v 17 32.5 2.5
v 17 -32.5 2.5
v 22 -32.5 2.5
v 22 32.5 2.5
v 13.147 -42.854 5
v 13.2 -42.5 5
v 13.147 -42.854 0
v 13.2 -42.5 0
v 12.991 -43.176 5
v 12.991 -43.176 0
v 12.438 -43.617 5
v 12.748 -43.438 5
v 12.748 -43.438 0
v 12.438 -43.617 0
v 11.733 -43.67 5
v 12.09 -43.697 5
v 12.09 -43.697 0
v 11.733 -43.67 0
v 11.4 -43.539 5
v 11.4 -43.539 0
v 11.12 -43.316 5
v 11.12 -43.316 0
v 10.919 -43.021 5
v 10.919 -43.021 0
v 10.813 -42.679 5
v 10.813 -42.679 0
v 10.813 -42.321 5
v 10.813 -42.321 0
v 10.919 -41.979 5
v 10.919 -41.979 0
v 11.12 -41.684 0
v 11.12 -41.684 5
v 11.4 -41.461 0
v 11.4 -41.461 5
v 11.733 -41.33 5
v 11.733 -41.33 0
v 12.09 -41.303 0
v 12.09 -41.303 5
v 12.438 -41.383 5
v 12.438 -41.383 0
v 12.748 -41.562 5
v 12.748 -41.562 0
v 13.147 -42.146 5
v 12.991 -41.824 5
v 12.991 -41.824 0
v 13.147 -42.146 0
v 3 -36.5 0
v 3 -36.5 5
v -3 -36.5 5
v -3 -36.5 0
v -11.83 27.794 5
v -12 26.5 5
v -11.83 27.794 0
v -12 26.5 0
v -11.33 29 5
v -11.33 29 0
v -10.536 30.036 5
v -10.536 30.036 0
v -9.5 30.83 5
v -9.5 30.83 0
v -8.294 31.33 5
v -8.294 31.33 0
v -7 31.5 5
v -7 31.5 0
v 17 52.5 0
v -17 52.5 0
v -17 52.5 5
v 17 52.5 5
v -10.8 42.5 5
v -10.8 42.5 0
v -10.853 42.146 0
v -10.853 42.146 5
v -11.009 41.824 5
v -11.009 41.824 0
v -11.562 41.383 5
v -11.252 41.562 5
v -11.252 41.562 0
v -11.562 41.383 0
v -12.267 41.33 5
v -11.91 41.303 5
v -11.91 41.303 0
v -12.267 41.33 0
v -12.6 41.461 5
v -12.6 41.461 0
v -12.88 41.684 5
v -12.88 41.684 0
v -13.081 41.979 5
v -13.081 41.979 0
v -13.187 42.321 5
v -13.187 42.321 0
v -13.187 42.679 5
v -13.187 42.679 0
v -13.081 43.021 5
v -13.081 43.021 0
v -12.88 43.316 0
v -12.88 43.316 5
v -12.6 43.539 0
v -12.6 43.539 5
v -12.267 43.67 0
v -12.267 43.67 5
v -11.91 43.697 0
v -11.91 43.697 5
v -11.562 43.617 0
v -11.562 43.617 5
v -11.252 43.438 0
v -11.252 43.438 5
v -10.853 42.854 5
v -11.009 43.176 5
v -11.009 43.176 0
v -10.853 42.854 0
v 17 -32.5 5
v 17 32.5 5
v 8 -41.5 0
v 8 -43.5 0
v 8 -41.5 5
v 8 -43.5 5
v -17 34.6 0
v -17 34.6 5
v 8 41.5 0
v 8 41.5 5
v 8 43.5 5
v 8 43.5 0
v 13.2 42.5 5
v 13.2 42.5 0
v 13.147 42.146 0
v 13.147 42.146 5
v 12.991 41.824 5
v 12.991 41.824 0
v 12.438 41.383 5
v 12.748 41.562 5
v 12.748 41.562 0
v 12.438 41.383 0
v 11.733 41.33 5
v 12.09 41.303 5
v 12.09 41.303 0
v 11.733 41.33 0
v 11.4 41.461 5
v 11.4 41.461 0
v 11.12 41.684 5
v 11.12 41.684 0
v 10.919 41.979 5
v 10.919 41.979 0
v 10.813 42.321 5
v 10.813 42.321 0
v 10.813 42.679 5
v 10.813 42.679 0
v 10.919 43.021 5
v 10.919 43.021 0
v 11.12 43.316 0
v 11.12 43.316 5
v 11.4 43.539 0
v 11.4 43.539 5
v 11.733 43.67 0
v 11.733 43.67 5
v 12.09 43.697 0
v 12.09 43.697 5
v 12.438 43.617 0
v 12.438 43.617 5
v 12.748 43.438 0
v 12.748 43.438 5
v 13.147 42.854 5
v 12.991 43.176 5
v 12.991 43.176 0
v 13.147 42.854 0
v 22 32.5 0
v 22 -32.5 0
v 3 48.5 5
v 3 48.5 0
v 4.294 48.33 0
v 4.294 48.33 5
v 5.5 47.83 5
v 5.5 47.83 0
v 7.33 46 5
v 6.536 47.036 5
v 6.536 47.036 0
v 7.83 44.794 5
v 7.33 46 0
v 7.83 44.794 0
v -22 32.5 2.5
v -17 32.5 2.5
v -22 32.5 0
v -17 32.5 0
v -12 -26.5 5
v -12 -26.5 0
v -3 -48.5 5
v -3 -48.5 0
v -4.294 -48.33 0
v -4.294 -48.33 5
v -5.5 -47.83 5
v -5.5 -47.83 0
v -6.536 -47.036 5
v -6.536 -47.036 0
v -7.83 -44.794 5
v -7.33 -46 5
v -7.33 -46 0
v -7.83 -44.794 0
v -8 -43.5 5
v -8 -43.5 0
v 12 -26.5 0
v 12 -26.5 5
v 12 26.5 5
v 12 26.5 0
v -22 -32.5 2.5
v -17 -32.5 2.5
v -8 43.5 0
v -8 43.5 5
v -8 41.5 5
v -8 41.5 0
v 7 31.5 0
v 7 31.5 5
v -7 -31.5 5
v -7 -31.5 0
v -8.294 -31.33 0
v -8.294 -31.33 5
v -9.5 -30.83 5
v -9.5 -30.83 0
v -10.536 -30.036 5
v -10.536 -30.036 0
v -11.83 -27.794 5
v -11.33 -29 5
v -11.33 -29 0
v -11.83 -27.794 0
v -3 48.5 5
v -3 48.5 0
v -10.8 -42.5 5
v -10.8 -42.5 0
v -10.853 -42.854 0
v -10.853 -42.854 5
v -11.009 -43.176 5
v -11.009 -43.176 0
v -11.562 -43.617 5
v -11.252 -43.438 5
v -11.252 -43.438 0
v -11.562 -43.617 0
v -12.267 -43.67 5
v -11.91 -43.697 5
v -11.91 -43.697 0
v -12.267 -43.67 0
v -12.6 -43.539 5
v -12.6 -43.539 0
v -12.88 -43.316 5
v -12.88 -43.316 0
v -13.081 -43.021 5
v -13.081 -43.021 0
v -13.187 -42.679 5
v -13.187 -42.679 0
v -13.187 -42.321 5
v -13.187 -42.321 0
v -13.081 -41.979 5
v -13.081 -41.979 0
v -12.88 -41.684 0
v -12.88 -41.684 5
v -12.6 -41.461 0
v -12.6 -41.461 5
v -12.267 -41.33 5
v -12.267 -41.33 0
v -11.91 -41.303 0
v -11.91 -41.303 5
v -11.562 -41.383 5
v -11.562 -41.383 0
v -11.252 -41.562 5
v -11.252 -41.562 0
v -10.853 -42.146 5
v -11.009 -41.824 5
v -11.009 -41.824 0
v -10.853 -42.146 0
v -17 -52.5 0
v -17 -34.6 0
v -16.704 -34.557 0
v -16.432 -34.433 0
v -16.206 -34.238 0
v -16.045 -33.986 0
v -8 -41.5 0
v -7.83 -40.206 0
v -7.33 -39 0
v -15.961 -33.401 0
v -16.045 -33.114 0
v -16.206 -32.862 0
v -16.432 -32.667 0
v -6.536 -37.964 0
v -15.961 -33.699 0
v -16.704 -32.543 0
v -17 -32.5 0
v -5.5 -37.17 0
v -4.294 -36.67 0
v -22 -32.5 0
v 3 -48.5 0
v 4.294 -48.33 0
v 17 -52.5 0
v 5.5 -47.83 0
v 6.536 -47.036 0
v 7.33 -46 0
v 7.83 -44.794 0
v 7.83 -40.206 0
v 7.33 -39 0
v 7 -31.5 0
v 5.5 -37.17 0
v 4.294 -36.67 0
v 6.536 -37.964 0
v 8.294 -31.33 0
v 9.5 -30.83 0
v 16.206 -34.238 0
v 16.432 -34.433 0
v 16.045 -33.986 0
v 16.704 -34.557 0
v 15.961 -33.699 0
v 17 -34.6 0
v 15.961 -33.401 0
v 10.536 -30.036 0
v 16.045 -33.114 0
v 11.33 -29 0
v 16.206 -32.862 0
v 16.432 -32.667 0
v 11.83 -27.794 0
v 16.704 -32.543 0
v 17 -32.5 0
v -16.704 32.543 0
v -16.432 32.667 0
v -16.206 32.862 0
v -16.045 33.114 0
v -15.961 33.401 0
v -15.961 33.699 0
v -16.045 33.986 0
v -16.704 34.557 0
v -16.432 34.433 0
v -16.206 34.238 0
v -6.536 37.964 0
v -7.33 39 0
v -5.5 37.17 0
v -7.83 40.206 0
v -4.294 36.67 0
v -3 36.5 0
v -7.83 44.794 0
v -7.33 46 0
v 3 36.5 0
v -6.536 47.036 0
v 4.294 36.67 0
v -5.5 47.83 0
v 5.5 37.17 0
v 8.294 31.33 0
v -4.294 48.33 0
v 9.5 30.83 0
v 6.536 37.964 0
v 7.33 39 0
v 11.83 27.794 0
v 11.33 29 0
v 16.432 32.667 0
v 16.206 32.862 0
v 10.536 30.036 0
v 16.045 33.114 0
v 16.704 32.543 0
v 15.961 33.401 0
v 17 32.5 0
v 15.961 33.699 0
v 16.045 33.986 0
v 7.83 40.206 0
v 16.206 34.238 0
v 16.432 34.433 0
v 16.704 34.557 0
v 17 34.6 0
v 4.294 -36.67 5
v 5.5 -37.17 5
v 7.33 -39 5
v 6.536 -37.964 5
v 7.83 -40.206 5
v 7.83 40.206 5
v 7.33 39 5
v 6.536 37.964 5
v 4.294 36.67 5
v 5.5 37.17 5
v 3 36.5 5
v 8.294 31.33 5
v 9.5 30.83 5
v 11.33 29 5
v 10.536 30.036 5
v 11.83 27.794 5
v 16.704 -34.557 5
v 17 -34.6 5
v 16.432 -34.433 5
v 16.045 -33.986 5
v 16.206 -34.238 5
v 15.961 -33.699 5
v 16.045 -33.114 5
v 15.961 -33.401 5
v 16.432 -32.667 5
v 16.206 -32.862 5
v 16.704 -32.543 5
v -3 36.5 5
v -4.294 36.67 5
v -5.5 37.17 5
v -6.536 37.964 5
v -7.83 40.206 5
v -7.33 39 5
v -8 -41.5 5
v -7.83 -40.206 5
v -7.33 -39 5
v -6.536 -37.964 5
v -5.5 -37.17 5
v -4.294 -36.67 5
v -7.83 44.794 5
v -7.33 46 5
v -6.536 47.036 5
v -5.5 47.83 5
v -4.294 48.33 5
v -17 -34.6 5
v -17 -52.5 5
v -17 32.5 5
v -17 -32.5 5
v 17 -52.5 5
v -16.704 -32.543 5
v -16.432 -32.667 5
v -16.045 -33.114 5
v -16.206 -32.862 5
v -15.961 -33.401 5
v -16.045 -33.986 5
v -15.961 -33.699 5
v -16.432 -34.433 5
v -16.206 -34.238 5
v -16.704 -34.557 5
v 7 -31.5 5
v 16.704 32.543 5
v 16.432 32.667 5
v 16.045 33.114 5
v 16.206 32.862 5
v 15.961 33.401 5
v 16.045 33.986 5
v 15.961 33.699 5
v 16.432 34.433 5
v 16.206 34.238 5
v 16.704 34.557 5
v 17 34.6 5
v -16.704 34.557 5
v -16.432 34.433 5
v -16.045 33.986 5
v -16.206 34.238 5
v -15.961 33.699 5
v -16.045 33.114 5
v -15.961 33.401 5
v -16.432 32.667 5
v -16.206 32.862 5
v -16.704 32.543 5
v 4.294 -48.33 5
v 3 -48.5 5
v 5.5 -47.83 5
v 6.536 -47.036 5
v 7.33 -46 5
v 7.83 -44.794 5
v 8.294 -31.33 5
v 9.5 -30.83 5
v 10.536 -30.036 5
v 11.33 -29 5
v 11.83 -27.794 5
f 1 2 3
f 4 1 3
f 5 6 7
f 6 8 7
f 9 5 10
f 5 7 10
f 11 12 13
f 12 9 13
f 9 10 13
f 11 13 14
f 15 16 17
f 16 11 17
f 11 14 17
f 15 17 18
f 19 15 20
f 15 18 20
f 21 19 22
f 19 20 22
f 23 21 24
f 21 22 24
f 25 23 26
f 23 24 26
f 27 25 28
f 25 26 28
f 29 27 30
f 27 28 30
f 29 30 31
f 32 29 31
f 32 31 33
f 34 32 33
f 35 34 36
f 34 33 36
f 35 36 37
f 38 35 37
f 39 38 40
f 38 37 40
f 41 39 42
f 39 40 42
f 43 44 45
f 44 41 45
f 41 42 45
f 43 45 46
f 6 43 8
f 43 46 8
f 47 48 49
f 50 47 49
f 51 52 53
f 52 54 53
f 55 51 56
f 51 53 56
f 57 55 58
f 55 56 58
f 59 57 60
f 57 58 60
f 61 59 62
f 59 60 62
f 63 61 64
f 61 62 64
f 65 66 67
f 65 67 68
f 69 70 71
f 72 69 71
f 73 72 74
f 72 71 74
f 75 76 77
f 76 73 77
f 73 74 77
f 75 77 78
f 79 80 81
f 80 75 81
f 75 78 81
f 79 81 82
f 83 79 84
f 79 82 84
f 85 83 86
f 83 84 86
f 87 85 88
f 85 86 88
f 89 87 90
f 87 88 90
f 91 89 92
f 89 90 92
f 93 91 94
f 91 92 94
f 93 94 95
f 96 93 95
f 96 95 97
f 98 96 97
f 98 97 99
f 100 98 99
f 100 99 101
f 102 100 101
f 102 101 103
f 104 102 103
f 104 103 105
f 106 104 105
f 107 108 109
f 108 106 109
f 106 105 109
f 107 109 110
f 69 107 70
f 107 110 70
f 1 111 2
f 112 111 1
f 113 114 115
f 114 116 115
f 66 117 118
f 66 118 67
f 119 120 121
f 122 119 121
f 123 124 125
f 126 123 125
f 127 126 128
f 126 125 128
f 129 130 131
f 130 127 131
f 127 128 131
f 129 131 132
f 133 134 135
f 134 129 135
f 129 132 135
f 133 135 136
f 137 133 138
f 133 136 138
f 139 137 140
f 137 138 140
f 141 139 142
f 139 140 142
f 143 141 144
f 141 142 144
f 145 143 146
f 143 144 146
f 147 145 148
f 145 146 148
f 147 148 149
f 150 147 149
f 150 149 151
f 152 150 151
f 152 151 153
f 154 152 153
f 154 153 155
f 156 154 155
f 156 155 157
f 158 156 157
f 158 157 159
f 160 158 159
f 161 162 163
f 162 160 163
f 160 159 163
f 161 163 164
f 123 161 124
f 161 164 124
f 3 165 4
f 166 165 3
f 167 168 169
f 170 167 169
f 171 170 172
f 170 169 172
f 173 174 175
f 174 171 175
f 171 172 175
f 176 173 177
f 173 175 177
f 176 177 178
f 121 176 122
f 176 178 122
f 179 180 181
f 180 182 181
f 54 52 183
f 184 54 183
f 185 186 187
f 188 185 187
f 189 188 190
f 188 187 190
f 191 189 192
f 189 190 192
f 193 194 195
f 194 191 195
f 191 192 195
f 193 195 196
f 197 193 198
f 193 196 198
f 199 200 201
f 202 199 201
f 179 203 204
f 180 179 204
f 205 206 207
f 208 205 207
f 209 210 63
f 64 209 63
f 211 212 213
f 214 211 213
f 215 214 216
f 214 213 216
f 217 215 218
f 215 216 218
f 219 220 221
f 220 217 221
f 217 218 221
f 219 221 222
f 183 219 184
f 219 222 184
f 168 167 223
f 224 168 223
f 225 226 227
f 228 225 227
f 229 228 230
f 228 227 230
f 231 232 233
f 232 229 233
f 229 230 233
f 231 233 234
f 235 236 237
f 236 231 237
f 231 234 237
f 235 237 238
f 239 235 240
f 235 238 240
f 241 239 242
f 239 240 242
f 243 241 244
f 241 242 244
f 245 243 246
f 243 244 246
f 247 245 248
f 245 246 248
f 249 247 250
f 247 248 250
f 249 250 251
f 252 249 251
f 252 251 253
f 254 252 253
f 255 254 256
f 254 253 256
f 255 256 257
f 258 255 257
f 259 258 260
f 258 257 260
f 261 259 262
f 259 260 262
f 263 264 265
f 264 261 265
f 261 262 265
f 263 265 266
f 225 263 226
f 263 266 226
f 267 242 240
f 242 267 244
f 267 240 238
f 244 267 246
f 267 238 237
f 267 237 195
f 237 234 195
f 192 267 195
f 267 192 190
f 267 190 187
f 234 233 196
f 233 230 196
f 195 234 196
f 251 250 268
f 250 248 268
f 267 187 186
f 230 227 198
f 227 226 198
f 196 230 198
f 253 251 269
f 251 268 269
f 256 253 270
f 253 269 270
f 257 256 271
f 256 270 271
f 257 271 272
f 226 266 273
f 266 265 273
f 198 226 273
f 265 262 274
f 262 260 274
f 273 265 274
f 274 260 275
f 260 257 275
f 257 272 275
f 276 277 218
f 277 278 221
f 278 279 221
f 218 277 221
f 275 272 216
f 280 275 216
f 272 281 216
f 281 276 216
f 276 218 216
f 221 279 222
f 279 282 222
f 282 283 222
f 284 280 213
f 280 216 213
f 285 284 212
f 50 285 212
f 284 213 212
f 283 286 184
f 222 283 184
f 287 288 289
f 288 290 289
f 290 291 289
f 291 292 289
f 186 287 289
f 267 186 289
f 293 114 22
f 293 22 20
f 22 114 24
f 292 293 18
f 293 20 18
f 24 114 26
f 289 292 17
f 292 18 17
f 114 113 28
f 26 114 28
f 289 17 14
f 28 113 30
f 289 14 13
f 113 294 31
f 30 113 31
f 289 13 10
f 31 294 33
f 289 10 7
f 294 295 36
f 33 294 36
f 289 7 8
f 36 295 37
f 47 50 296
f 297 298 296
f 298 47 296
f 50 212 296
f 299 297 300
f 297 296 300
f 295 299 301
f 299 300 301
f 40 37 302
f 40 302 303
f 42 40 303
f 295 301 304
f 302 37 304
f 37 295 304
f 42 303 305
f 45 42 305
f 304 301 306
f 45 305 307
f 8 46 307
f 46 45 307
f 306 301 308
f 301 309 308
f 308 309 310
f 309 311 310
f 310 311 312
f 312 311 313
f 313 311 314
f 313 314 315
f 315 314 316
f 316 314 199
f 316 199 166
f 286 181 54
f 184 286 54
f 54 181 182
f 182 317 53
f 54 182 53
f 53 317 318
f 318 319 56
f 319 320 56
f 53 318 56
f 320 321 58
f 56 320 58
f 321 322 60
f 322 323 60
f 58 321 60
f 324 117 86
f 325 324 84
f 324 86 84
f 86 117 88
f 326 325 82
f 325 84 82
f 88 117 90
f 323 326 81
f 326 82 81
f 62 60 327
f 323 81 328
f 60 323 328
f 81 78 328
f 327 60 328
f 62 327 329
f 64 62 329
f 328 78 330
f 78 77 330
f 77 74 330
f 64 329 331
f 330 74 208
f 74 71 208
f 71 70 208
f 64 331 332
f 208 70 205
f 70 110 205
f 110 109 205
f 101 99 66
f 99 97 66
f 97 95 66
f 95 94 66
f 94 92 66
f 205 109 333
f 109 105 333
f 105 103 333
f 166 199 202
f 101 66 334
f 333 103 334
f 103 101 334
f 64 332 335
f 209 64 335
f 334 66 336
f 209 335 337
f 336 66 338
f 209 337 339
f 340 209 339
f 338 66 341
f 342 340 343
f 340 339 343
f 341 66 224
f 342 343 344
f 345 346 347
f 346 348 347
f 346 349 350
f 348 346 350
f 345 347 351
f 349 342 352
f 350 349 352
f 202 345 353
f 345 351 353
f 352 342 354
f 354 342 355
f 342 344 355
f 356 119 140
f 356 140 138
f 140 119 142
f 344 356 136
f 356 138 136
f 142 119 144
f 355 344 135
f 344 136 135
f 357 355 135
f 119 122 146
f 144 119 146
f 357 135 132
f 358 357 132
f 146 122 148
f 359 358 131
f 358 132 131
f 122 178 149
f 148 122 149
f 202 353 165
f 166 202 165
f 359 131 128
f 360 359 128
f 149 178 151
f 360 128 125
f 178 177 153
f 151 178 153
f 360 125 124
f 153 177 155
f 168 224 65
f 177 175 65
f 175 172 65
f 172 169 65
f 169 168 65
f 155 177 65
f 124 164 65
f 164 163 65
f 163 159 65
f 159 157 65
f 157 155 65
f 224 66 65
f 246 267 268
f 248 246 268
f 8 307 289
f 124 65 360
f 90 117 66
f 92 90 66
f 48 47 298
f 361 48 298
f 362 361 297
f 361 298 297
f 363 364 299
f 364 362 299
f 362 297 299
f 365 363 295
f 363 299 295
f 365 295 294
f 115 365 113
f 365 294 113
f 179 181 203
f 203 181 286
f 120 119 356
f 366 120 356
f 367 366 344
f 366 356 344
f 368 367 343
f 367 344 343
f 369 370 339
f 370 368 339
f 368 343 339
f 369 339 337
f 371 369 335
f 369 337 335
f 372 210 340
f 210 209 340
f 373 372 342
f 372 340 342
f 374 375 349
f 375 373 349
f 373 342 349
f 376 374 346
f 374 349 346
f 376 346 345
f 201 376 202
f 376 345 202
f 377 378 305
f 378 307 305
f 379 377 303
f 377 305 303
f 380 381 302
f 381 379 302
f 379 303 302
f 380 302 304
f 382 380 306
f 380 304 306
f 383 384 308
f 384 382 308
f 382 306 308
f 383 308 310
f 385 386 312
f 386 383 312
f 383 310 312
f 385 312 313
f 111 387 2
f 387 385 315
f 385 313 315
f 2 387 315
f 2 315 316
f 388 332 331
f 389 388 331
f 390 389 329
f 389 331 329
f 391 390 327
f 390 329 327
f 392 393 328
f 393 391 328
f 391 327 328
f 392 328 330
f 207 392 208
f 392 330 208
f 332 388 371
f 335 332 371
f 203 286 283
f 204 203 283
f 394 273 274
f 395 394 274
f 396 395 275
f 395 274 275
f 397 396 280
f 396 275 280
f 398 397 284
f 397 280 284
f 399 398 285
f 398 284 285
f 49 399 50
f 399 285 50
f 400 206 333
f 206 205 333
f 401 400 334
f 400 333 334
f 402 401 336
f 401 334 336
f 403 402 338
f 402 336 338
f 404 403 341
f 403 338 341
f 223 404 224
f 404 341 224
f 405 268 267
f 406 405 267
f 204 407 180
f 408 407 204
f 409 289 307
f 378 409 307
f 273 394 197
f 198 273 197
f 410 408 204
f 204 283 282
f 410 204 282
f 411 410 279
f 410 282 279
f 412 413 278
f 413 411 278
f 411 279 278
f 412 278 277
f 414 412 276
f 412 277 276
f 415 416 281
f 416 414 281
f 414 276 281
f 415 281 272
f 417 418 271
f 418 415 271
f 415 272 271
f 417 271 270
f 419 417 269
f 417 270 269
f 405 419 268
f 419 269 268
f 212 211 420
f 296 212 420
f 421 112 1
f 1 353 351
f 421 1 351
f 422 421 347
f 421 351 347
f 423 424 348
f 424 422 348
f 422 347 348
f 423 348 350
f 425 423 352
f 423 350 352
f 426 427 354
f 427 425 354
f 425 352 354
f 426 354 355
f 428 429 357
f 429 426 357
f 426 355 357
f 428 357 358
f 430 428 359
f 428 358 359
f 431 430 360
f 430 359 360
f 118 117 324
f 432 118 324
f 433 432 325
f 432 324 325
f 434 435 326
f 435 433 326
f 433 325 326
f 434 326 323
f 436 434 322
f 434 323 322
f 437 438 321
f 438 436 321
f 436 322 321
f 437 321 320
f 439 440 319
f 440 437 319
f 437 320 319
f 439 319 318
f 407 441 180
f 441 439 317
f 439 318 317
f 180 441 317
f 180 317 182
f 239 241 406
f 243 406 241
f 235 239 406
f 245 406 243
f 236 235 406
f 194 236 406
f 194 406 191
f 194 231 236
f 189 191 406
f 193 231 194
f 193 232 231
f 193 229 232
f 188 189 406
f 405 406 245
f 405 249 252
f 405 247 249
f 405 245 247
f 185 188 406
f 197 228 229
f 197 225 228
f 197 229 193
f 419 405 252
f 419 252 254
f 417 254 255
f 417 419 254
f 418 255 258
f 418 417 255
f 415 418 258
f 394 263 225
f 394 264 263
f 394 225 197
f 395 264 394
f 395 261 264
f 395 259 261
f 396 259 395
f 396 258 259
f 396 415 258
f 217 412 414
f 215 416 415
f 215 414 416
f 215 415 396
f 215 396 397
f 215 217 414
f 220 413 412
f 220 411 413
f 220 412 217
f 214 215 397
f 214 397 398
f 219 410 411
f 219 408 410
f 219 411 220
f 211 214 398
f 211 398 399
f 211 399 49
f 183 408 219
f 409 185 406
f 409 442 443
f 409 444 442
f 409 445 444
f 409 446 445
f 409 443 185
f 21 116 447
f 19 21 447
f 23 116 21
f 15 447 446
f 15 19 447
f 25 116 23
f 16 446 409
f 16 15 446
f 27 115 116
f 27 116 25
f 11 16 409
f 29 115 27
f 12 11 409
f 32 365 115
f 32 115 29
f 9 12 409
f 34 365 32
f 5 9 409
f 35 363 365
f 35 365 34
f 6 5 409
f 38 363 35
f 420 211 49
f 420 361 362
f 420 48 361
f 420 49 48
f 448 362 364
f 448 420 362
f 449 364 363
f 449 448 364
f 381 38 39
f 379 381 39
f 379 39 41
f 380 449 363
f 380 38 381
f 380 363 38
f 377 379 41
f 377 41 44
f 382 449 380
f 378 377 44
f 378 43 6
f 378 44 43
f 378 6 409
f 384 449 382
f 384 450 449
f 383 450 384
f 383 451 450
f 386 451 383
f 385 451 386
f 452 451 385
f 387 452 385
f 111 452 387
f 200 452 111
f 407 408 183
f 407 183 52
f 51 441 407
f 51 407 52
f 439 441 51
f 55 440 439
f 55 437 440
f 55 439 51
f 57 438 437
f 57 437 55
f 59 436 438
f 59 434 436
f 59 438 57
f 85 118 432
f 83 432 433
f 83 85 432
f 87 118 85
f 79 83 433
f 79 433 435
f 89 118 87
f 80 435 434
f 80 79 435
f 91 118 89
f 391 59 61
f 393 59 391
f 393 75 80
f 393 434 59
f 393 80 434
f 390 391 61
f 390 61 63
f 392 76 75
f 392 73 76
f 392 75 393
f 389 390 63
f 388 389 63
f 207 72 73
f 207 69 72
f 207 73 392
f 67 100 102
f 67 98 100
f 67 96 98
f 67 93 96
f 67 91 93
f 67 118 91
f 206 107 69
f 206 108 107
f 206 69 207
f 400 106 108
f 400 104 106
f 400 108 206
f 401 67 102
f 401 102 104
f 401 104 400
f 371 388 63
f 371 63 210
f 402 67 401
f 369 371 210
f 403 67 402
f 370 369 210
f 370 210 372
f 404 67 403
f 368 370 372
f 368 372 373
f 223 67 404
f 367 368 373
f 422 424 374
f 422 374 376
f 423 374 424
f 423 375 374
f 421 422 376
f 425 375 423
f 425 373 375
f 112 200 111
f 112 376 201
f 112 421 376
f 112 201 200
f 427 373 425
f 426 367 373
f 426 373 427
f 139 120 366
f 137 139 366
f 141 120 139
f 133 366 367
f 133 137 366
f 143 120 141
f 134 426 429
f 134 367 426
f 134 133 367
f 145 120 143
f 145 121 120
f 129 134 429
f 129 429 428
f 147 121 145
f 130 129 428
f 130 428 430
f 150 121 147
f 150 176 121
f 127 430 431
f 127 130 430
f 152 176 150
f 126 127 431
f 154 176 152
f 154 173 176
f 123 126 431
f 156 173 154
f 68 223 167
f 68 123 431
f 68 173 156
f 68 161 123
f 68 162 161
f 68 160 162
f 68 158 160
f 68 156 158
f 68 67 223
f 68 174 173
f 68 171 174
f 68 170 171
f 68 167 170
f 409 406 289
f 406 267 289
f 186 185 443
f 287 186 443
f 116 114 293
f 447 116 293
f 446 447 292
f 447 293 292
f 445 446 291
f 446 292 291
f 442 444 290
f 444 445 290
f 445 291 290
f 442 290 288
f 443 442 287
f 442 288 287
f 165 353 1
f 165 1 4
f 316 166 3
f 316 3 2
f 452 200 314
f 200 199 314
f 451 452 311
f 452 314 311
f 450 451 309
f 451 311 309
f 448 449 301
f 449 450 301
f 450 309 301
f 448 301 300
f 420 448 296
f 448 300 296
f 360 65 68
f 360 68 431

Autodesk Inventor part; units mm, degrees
ref_plane "YZ Plane" through (0, 0, 0) normal (1, 0, 0) x (0, 1, 0)
ref_plane "XZ Plane" through (0, 0, 0) normal (0, 1, 0) x (-1, 0, 0)
ref_plane "XY Plane" through (0, 0, 0) normal (0, 0, 1) x (1, 0, 0)
sketch "スケッチ1" plane through (0, 0, 0) normal (0, 0, 1) x (1, 0, 0)
  line L0 (-17, -52.5) -> (17, -52.5) construction
  line L1 (17, -52.5) -> (17, 52.5) construction
  line L2 (17, 52.5) -> (-17, 52.5) construction
  line L3 (-17, 52.5) -> (-17, -52.5) construction
  line L4 (-17, -52.5) -> (17, 52.5) construction
  line L5 (17, -52.5) -> (-17, 52.5) construction
  line L6 (-17, 34.6) -> (-17, 52.5)
  line L7 (-17, 52.5) -> (17, 52.5)
  line L8 (17, 52.5) -> (17, 34.6)
  line L9 (-17, -34.6) -> (-17, -52.5)
  line L10 (-17, -52.5) -> (17, -52.5)
  line L11 (17, -52.5) -> (17, -34.6)
  line L12 (-17, 32.5) -> (-22, 32.5)
  line L13 (-22, 32.5) -> (-22, -32.5)
  line L14 (-22, -32.5) -> (-17, -32.5)
  line L15 (17, 32.5) -> (22, 32.5)
  line L16 (22, 32.5) -> (22, -32.5)
  line L17 (22, -32.5) -> (17, -32.5)
  arc A0 (-17, 32.5) -> (-17, 34.6) centre (-17, 33.55) ccw
  arc A1 (-17, -34.6) -> (-17, -32.5) centre (-17, -33.55) ccw
  arc A2 (17, 34.6) -> (17, 32.5) centre (17, 33.55) ccw
  arc A3 (17, -32.5) -> (17, -34.6) centre (17, -33.55) ccw
  line L18 (0, 0) -> (17, 0) construction
  line L19 (0, 0) -> (0, 52.5) construction
  line L20 (-12, 42.5) -> (12, 42.5) construction
  line L21 (12, 42.5) -> (12, -42.5) construction
  line L22 (12, -42.5) -> (-12, -42.5) construction
  line L23 (-12, -42.5) -> (-12, 42.5) construction
  circle A4 centre (-12, 42.5) radius 1.2
  circle A5 centre (12, 42.5) radius 1.2
  circle A6 centre (12, -42.5) radius 1.2
  circle A7 centre (-12, -42.5) radius 1.2
  point P0 (0, 42.5)
  point P1 (0, 0)
  dimension "d87" = 1.05
  dimension "d88" = 105
  dimension "d89" = 5
  dimension "d90" = 20
  dimension "d91" = 34
  dimension "d92" = 2.4
  dimension "d93" = 5
  dimension "d94" = 10
  dimension "d95" = 10
extrude "押し出し1" add sketch "スケッチ1" along normal blind 5
sketch "スケッチ2" plane through (0, 0, 5) normal (0, 0, 1) x (1, 0, 0)
  line L0 (-17, 52.5) -> (-17, 34.6) projected
  line L1 (17, 34.6) -> (17, 52.5) projected
  line L2 (-40.5884, 60.19) -> (-17, 60.19)
  line L3 (-17, 60.19) -> (-17, -101.7483)
  line L4 (-17, -101.7483) -> (-40.5884, -101.7483)
  line L5 (-40.5884, -101.7483) -> (-40.5884, 60.19)
  line L6 (53.5752, 90.4043) -> (17, 90.4043)
  line L7 (17, 90.4043) -> (17, -93.5321)
  line L8 (17, -93.5321) -> (53.5752, -93.5321)
  line L9 (53.5752, -93.5321) -> (53.5752, 90.4043)
  point P0 (0, 0)
extrude "押し出し2" cut sketch "スケッチ2" against normal blind 2.5
sketch "スケッチ3" plane through (0, 0, 5) normal (0, 0, 1) x (1, 0, 0)
  line L0 (17, -32.5) -> (17, 32.5) projected
  line L1 (17, 52.5) -> (-17, 52.5) projected
  line L2 (-17, 32.5) -> (-17, -32.5) projected
  line L3 (-17, -52.5) -> (17, -52.5) projected
  circle A0 centre (-12, -42.5) radius 1.2 projected
  circle A1 centre (-12, 42.5) radius 1.2 projected
  line L4 (-8, -48.5) -> (8, -48.5)
  line L5 (8, -48.5) -> (8, -36.5)
  line L6 (8, -36.5) -> (-8, -36.5)
  line L7 (-8, -36.5) -> (-8, -48.5)
  line L8 (-12, -31.5) -> (12, -31.5)
  line L9 (12, -31.5) -> (12, 31.5)
  line L10 (12, 31.5) -> (-12, 31.5)
  line L11 (-12, 31.5) -> (-12, -31.5)
  line L12 (-8, 36.5) -> (8, 36.5)
  line L13 (8, 36.5) -> (8, 48.5)
  line L14 (8, 48.5) -> (-8, 48.5)
  line L15 (-8, 48.5) -> (-8, 36.5)
  line L16 (0, 52.5) -> (0, -52.5) construction
  line L17 (-17, 0) -> (17, 0) construction
  point P0 (0, 0)
  point P1 (0, -31.5)
  dimension "d100" = 4
  dimension "d101" = 4
  dimension "d102" = 4
  dimension "d103" = 4
  dimension "d104" = 6
  dimension "d105" = 5
  dimension "d106" = 6
  dimension "d107" = 5
  dimension "d108" = 5
extrude "押し出し3" cut sketch "スケッチ3" against normal blind 10 contours L7 L6 L5 L4 | L11 L10 L9 L8 | L15 L14 L13 L12
fillet "フィレット1" radius 5 12 edges at (-8, 48.5, 2.5) (8, 48.5, 2.5) (-8, 36.5, 2.5) (8, 36.5, 2.5) (-12, 31.5, 2.5) (12, 31.5, 2.5) (12, -31.5, 2.5) (-12, -31.5, 2.5) (-8, -36.5, 2.5) (-8, -48.5, 2.5) (8, -48.5, 2.5) (8, -36.5, 2.5)
equation "\"d88\" = d83"
equation "\"d90\" = d84"
equation "\"d102\" = d101"
equation "\"d103\" = d100"
equation "\"d106\" = d104"
equation "\"d107\" = d105"
equation "\"d83\" = 105"
equation "\"d84\" = 20"
properties part number "コックピット_2_サブフレーム_5" material "アセタール樹脂、黒"
